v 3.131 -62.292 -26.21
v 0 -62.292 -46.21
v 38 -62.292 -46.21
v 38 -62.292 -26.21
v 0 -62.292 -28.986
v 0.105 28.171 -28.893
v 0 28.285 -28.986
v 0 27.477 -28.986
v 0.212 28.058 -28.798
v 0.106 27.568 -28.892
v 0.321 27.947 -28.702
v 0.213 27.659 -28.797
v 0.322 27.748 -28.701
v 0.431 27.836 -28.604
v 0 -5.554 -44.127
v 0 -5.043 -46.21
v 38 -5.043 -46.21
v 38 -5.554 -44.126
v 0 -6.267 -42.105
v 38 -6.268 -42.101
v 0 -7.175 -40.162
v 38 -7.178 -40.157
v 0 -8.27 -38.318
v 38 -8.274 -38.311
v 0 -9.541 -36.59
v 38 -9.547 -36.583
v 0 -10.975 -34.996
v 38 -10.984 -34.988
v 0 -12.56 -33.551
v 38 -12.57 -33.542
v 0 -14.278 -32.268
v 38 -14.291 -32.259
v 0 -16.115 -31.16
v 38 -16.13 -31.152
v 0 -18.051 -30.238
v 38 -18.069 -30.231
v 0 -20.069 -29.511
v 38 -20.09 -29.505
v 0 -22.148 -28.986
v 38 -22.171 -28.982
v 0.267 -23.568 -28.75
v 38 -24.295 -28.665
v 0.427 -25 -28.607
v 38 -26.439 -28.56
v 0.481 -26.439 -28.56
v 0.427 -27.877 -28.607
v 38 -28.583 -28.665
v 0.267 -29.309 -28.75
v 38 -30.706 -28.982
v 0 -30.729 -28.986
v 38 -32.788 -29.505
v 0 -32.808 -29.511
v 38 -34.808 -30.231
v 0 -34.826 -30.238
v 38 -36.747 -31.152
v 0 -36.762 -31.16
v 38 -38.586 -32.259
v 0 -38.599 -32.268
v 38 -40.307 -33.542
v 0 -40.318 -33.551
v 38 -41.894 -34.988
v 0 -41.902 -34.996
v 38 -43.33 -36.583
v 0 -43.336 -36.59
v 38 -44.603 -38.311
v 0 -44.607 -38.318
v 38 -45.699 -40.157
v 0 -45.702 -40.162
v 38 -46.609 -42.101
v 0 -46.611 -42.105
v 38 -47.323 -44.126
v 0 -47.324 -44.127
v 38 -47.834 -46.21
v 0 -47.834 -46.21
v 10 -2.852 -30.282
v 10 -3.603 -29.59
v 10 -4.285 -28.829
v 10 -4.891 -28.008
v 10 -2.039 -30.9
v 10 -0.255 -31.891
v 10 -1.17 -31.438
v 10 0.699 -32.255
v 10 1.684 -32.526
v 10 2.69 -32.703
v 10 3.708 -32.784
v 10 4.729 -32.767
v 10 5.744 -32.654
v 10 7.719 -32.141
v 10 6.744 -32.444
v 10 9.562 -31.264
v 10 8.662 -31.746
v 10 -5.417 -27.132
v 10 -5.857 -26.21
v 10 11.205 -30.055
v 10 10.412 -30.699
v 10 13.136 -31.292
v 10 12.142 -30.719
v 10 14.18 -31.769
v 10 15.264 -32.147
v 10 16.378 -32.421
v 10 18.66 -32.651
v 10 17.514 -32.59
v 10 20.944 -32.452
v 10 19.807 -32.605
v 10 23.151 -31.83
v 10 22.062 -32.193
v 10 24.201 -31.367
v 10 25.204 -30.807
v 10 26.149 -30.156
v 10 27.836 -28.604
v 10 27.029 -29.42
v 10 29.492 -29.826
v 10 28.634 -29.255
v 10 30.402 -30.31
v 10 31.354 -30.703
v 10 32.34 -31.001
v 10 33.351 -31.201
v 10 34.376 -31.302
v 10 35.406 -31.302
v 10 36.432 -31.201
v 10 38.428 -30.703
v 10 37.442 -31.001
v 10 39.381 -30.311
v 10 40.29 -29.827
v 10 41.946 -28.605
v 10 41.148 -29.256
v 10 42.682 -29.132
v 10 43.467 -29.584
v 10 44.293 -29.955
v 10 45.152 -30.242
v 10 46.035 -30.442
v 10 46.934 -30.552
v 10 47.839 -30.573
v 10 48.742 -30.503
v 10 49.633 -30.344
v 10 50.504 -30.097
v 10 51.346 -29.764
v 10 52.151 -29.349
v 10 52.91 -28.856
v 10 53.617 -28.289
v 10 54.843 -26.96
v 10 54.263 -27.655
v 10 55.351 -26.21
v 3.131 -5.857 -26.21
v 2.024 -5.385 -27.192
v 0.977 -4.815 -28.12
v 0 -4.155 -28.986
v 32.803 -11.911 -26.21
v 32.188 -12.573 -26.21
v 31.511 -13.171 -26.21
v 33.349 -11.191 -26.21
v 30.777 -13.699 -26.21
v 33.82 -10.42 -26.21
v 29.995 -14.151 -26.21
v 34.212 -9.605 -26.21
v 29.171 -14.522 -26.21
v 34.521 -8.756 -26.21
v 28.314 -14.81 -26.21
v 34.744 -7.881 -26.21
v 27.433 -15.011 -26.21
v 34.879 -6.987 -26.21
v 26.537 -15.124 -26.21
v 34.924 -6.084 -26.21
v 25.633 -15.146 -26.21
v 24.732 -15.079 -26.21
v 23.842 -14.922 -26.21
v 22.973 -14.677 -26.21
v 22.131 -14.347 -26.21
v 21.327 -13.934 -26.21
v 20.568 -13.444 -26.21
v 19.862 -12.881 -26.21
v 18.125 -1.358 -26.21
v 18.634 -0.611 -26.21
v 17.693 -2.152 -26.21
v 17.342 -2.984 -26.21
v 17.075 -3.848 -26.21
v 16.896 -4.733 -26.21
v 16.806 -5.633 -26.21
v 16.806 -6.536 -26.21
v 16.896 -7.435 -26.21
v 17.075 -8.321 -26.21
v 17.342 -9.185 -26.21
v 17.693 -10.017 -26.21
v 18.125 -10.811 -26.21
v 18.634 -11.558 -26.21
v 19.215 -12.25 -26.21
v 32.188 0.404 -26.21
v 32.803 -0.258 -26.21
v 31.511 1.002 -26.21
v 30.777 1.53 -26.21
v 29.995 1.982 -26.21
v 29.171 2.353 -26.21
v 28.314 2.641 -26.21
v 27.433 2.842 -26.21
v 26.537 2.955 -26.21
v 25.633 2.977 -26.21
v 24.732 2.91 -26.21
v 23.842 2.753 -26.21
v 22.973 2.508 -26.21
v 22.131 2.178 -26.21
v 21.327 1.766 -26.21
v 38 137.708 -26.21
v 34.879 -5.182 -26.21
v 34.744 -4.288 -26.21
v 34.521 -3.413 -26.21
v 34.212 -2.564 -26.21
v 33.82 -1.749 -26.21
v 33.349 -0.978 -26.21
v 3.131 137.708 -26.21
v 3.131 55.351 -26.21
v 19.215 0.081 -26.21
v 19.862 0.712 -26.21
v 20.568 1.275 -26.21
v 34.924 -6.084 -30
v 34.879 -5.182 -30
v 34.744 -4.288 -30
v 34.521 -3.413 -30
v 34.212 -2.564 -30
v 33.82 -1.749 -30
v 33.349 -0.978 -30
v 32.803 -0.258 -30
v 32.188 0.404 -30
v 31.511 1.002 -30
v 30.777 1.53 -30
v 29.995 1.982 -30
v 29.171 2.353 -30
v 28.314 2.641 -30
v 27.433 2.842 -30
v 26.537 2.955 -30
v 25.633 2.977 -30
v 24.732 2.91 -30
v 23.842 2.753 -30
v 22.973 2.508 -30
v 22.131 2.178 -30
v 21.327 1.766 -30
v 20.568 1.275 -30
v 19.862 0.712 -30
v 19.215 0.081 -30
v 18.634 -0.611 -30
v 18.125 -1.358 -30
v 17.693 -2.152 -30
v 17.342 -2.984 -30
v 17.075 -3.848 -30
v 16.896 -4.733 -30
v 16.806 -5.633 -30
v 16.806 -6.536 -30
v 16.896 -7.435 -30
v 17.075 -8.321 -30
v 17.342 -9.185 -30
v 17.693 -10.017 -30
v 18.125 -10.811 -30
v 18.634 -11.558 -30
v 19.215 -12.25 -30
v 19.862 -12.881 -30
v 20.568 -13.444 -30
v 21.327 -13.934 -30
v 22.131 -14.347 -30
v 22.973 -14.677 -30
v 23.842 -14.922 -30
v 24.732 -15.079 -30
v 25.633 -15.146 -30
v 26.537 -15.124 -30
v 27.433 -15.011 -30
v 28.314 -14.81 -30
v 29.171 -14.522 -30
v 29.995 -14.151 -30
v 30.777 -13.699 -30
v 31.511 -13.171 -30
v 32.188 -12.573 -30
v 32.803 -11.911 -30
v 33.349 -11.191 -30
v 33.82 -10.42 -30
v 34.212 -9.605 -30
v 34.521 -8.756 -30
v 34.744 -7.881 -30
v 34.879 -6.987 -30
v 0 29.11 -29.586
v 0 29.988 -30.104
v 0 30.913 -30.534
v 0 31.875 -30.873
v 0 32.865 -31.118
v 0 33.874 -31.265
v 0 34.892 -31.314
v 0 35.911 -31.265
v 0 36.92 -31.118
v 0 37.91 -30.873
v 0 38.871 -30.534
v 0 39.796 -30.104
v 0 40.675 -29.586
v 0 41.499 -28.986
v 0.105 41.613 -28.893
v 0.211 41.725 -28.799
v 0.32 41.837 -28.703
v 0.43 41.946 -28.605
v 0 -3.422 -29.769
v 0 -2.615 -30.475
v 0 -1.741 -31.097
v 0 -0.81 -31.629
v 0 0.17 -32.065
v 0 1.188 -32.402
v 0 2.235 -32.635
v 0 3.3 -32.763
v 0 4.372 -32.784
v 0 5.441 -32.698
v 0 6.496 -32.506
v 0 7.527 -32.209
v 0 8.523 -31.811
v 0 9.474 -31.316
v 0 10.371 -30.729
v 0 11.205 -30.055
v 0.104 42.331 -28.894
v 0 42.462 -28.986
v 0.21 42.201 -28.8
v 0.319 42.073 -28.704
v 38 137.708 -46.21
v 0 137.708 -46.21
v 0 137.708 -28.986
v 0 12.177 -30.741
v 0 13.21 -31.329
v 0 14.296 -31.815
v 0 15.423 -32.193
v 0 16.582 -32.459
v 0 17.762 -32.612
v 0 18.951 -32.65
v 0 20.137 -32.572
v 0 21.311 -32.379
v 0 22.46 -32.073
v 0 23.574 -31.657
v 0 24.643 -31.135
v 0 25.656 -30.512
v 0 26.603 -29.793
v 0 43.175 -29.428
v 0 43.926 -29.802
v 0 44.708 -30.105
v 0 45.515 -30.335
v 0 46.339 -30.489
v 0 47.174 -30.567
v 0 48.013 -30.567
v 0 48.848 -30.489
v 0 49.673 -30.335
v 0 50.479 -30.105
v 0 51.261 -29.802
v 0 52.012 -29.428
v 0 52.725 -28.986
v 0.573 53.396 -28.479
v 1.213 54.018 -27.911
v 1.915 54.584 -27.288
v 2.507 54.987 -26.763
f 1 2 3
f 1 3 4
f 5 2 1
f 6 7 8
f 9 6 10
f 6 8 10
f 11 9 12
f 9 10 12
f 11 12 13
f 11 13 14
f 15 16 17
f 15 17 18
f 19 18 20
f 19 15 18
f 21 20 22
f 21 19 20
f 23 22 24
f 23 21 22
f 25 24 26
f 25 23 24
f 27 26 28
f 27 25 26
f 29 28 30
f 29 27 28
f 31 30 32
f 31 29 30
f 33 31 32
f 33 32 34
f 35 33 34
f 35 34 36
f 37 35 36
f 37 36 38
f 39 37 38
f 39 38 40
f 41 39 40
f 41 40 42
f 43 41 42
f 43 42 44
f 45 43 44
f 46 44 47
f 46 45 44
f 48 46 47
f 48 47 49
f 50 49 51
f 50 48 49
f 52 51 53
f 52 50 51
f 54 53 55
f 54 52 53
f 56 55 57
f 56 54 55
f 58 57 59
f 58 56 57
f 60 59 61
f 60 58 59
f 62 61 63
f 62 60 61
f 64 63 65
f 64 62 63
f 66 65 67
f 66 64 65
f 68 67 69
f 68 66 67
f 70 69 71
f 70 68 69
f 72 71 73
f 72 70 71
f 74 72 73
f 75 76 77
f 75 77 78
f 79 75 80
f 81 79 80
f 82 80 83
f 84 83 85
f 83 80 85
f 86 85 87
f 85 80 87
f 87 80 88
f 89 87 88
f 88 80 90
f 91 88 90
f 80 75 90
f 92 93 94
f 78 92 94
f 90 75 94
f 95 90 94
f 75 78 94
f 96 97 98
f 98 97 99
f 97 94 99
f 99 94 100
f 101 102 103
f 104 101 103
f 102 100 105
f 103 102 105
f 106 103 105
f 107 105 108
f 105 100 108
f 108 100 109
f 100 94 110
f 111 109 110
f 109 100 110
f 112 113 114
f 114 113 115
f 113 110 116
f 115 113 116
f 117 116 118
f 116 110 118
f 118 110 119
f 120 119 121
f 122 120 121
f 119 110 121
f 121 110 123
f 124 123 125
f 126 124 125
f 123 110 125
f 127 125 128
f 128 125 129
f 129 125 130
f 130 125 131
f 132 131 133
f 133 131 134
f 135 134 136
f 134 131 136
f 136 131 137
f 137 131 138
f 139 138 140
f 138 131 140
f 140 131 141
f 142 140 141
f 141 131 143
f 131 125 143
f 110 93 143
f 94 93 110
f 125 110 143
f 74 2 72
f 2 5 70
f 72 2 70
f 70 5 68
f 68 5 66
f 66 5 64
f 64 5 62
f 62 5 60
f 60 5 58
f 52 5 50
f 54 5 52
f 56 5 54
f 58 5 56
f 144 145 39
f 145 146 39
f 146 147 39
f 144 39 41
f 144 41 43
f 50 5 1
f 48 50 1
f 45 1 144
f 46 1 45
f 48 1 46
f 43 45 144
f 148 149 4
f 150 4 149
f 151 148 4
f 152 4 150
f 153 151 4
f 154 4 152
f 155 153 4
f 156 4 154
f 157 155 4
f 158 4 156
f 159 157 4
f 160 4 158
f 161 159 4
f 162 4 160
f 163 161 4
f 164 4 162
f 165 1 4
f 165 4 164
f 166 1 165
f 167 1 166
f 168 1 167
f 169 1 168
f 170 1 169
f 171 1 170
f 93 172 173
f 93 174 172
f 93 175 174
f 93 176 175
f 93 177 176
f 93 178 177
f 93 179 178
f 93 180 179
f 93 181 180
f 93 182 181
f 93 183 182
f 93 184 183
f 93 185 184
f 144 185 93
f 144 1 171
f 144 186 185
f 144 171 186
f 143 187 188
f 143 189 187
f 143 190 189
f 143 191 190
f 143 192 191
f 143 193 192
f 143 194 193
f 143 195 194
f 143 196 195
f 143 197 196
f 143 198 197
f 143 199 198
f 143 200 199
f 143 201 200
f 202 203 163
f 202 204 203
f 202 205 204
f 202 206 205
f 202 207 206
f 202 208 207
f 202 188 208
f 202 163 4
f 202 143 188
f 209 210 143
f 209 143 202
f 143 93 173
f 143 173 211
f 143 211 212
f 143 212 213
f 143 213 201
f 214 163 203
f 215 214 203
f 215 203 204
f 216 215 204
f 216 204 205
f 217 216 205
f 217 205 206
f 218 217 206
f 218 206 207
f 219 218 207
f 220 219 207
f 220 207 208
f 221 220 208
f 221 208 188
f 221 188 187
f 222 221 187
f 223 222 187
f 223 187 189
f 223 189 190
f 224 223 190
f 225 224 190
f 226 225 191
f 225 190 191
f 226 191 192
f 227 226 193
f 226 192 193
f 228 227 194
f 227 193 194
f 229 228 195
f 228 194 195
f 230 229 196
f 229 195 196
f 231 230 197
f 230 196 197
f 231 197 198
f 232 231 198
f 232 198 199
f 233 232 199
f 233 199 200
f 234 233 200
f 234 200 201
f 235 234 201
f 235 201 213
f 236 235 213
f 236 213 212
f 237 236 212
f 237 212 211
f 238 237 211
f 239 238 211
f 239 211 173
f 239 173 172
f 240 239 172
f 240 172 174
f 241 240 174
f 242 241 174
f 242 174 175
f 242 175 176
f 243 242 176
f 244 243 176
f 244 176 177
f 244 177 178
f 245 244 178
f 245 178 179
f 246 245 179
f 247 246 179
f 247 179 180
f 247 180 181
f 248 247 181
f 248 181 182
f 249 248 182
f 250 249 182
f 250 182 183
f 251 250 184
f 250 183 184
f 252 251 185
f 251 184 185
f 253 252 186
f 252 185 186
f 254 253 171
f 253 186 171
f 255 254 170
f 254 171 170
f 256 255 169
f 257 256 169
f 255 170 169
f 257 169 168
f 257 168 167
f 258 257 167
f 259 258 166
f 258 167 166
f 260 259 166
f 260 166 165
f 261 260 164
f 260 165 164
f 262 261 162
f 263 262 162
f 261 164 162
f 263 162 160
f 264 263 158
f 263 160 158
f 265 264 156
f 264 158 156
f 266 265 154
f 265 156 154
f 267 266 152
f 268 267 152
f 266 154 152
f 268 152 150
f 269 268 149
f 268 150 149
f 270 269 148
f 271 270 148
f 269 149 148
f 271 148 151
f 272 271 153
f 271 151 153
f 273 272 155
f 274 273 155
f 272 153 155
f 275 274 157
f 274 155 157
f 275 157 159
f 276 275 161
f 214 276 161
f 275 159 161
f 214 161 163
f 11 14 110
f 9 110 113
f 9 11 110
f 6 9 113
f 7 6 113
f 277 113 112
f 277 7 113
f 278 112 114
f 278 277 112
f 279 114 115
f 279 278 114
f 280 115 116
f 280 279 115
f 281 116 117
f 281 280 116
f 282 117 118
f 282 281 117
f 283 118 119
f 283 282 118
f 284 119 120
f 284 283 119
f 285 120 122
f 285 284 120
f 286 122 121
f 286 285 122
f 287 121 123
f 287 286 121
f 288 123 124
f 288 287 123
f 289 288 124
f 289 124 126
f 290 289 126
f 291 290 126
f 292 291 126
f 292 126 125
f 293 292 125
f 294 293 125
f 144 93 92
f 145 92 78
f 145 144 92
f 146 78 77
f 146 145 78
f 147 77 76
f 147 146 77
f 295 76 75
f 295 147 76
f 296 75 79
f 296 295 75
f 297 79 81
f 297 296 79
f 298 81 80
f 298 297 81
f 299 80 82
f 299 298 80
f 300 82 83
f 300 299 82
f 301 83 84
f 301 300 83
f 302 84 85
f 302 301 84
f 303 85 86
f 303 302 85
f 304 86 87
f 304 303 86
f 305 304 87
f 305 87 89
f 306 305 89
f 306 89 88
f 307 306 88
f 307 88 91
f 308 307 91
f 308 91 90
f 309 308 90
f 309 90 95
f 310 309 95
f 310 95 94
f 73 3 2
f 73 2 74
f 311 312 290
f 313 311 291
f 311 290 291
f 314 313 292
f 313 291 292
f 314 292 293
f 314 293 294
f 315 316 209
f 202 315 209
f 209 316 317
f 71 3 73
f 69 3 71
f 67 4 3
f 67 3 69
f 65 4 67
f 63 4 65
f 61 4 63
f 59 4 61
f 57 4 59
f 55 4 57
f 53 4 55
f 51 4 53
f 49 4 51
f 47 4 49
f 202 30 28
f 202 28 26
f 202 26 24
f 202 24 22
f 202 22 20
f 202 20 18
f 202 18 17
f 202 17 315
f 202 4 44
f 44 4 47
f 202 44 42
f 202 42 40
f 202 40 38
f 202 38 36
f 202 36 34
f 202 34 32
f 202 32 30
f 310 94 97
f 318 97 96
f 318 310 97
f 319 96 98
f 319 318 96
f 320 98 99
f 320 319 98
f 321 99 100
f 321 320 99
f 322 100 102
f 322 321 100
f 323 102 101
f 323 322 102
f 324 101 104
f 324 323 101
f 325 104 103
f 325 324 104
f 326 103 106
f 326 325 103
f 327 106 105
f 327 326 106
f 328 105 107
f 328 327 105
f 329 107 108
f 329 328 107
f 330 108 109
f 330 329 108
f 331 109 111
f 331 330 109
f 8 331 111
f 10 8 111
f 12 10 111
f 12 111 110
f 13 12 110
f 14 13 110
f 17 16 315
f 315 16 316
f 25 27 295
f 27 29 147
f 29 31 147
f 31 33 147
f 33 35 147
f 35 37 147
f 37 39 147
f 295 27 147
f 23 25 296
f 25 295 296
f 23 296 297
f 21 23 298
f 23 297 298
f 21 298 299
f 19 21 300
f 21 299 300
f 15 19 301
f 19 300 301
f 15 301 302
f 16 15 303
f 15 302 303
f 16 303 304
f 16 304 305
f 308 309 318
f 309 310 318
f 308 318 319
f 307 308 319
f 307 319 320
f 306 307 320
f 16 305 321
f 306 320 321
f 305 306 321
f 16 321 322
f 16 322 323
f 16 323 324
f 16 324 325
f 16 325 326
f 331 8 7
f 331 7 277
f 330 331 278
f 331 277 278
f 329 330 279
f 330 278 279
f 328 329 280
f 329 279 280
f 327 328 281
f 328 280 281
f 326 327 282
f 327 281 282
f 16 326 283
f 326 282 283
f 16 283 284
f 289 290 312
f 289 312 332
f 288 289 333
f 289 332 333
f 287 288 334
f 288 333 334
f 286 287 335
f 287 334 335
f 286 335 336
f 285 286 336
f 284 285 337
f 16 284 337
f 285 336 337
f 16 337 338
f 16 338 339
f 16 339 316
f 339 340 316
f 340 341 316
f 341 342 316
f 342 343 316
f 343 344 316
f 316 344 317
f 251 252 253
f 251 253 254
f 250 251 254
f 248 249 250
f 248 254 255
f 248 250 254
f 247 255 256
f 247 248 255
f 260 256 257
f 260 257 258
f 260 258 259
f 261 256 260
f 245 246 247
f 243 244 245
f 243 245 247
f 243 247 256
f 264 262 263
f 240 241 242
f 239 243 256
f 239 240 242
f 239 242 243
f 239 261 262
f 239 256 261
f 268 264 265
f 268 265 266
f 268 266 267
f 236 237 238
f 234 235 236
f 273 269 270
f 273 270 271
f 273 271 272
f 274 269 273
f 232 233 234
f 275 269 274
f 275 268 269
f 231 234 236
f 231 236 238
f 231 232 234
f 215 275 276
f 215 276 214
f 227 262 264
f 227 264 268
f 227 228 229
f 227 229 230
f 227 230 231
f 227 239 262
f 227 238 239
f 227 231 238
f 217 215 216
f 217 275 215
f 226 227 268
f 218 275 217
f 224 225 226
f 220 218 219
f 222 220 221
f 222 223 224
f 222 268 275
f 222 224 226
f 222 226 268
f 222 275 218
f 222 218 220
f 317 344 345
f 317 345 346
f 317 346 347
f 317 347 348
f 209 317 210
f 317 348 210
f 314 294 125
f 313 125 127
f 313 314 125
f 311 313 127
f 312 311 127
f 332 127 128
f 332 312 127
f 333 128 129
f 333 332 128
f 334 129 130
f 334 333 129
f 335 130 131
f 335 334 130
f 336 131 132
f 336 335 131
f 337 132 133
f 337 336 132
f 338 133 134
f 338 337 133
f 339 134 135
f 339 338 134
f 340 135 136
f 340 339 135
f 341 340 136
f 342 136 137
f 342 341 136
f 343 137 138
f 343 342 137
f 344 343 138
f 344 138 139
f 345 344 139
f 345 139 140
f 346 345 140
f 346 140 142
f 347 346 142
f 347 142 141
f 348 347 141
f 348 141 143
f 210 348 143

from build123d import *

# Parameters (mm, degrees)
F0_W     = 200
F0_H     = 20
F1_DEPTH = 38
F2_R     = 21.793090142
F3_DEPTH = 90
F5_DEPTH = 10
F6_R     = 9.0643869575
F7_DEPTH = 30
F9_DEPTH = 500


with BuildPart() as f1:
    # F0 (on Right) → F1 (new body)
    with BuildSketch(Plane.YZ):
        with Locations((37.7075445842, -36.2104274062)):
            Rectangle(F0_W, F0_H)
    extrude(amount=F1_DEPTH)

    # F2 (on Right) → F3 (cut)
    with BuildSketch(Plane.YZ):
        with Locations((-26.4385696501, -50.3528229892)):
            Circle(F2_R)
    extrude(amount=F3_DEPTH, mode=Mode.SUBTRACT)

    # F4 (on Right) → F5 (cut)
    with BuildSketch(Plane.YZ):
        with BuildLine():
            ThreePointArc((11.2052927819, -30.0548411677), (13.8513494477, -26.4329954922), (14.787788926, -22.0463722944))
            ThreePointArc((14.787788926, -22.0463722944), (13.3069508893, -16.6036806846), (9.2726999384, -12.6615248637))
            ThreePointArc((9.2726999384, -12.6615248637), (6.5794975023, -21.7647944508), (11.2052927819, -30.0548411677))
        make_face()
        with BuildLine():
            ThreePointArc((9.2726999384, -12.6615248637), (13.3069508893, -16.6036806846), (14.787788926, -22.0463722944))
            ThreePointArc((14.787788926, -22.0463722944), (13.8513494477, -26.4329954922), (11.2052927819, -30.0548411677))
            ThreePointArc((11.2052927819, -30.0548411677), (19.8066220011, -32.6052268486), (27.8363086721, -28.6037941775))
            ThreePointArc((27.8363086721, -28.6037941775), (24.3564768067, -20.5394542894), (28.1950566672, -12.6395737651))
            ThreePointArc((28.1950566672, -12.6395737651), (18.7286864775, -8.1750752909), (9.2726999384, -12.6615248637))
        make_face()
        with BuildLine():
            ThreePointArc((11.2052927819, -30.0548411677), (6.5794975023, -21.7647944508), (9.2726999384, -12.6615248637))
            ThreePointArc((9.2726999384, -12.6615248637), (-6.6314854274, -23.2326830707), (11.2052927819, -30.0548411677))
        make_face()
        with BuildLine():
            ThreePointArc((42.792336068, -13.8019084932), (35.7285589591, -10.2711993263), (28.1950566672, -12.6395737651))
            ThreePointArc((28.1950566672, -12.6395737651), (30.2635700166, -16.2843509129), (30.9811221322, -20.4133056104))
            ThreePointArc((30.9811221322, -20.4133056104), (30.1678997374, -24.800045706), (27.8363086721, -28.6037941775))
            ThreePointArc((27.8363086721, -28.6037941775), (34.8911306198, -31.3144718481), (41.9464400799, -28.6050633204))
            ThreePointArc((41.9464400799, -28.6050633204), (38.534072164, -20.984324628), (42.792336068, -13.8019084932))
        make_face()
        with BuildLine():
            ThreePointArc((30.9811221322, -20.4133056104), (30.2635700166, -16.2843509129), (28.1950566672, -12.6395737651))
            ThreePointArc((28.1950566672, -12.6395737651), (24.3564768067, -20.5394542894), (27.8363086721, -28.6037941775))
            ThreePointArc((27.8363086721, -28.6037941775), (30.1678997374, -24.800045706), (30.9811221322, -20.4133056104))
        make_face()
        with BuildLine():
            ThreePointArc((56.6680879545, -21.5020179749), (51.9968309101, -13.5674704697), (42.792336068, -13.8019084932))
            ThreePointArc((42.792336068, -13.8019084932), (44.7488004803, -17.0479416086), (45.430340027, -20.7762103528))
            ThreePointArc((45.430340027, -20.7762103528), (44.5200498141, -25.0607318438), (41.9464400799, -28.6050633204))
            ThreePointArc((41.9464400799, -28.6050633204), (51.5369946086, -29.674841375), (56.6680879545, -21.5020179749))
        make_face()
        with BuildLine():
            ThreePointArc((45.430340027, -20.7762103528), (44.7488004803, -17.0479416086), (42.792336068, -13.8019084932))
            ThreePointArc((42.792336068, -13.8019084932), (38.534072164, -20.984324628), (41.9464400799, -28.6050633204))
            ThreePointArc((41.9464400799, -28.6050633204), (44.5200498141, -25.0607318438), (45.430340027, -20.7762103528))
        make_face()
    extrude(amount=F5_DEPTH, mode=Mode.SUBTRACT)

    # F6 (on Top) → F7 (cut)
    with BuildSketch(Plane.XY):
        with Locations((25.8594062179, -6.084471941)):
            Circle(F6_R)
    extrude(amount=-F7_DEPTH, mode=Mode.SUBTRACT)

    # F8 (on Front) → F9 (cut, symmetric)
    with BuildSketch(Plane.XZ):
        Polygon((-0.5932430504, -29.512187466), (3.8069577422, -25.6109777838), (-0.5932430504, -25.7017035037), align=None)
    extrude(amount=F9_DEPTH, both=True, mode=Mode.SUBTRACT)


solid = f1.part
